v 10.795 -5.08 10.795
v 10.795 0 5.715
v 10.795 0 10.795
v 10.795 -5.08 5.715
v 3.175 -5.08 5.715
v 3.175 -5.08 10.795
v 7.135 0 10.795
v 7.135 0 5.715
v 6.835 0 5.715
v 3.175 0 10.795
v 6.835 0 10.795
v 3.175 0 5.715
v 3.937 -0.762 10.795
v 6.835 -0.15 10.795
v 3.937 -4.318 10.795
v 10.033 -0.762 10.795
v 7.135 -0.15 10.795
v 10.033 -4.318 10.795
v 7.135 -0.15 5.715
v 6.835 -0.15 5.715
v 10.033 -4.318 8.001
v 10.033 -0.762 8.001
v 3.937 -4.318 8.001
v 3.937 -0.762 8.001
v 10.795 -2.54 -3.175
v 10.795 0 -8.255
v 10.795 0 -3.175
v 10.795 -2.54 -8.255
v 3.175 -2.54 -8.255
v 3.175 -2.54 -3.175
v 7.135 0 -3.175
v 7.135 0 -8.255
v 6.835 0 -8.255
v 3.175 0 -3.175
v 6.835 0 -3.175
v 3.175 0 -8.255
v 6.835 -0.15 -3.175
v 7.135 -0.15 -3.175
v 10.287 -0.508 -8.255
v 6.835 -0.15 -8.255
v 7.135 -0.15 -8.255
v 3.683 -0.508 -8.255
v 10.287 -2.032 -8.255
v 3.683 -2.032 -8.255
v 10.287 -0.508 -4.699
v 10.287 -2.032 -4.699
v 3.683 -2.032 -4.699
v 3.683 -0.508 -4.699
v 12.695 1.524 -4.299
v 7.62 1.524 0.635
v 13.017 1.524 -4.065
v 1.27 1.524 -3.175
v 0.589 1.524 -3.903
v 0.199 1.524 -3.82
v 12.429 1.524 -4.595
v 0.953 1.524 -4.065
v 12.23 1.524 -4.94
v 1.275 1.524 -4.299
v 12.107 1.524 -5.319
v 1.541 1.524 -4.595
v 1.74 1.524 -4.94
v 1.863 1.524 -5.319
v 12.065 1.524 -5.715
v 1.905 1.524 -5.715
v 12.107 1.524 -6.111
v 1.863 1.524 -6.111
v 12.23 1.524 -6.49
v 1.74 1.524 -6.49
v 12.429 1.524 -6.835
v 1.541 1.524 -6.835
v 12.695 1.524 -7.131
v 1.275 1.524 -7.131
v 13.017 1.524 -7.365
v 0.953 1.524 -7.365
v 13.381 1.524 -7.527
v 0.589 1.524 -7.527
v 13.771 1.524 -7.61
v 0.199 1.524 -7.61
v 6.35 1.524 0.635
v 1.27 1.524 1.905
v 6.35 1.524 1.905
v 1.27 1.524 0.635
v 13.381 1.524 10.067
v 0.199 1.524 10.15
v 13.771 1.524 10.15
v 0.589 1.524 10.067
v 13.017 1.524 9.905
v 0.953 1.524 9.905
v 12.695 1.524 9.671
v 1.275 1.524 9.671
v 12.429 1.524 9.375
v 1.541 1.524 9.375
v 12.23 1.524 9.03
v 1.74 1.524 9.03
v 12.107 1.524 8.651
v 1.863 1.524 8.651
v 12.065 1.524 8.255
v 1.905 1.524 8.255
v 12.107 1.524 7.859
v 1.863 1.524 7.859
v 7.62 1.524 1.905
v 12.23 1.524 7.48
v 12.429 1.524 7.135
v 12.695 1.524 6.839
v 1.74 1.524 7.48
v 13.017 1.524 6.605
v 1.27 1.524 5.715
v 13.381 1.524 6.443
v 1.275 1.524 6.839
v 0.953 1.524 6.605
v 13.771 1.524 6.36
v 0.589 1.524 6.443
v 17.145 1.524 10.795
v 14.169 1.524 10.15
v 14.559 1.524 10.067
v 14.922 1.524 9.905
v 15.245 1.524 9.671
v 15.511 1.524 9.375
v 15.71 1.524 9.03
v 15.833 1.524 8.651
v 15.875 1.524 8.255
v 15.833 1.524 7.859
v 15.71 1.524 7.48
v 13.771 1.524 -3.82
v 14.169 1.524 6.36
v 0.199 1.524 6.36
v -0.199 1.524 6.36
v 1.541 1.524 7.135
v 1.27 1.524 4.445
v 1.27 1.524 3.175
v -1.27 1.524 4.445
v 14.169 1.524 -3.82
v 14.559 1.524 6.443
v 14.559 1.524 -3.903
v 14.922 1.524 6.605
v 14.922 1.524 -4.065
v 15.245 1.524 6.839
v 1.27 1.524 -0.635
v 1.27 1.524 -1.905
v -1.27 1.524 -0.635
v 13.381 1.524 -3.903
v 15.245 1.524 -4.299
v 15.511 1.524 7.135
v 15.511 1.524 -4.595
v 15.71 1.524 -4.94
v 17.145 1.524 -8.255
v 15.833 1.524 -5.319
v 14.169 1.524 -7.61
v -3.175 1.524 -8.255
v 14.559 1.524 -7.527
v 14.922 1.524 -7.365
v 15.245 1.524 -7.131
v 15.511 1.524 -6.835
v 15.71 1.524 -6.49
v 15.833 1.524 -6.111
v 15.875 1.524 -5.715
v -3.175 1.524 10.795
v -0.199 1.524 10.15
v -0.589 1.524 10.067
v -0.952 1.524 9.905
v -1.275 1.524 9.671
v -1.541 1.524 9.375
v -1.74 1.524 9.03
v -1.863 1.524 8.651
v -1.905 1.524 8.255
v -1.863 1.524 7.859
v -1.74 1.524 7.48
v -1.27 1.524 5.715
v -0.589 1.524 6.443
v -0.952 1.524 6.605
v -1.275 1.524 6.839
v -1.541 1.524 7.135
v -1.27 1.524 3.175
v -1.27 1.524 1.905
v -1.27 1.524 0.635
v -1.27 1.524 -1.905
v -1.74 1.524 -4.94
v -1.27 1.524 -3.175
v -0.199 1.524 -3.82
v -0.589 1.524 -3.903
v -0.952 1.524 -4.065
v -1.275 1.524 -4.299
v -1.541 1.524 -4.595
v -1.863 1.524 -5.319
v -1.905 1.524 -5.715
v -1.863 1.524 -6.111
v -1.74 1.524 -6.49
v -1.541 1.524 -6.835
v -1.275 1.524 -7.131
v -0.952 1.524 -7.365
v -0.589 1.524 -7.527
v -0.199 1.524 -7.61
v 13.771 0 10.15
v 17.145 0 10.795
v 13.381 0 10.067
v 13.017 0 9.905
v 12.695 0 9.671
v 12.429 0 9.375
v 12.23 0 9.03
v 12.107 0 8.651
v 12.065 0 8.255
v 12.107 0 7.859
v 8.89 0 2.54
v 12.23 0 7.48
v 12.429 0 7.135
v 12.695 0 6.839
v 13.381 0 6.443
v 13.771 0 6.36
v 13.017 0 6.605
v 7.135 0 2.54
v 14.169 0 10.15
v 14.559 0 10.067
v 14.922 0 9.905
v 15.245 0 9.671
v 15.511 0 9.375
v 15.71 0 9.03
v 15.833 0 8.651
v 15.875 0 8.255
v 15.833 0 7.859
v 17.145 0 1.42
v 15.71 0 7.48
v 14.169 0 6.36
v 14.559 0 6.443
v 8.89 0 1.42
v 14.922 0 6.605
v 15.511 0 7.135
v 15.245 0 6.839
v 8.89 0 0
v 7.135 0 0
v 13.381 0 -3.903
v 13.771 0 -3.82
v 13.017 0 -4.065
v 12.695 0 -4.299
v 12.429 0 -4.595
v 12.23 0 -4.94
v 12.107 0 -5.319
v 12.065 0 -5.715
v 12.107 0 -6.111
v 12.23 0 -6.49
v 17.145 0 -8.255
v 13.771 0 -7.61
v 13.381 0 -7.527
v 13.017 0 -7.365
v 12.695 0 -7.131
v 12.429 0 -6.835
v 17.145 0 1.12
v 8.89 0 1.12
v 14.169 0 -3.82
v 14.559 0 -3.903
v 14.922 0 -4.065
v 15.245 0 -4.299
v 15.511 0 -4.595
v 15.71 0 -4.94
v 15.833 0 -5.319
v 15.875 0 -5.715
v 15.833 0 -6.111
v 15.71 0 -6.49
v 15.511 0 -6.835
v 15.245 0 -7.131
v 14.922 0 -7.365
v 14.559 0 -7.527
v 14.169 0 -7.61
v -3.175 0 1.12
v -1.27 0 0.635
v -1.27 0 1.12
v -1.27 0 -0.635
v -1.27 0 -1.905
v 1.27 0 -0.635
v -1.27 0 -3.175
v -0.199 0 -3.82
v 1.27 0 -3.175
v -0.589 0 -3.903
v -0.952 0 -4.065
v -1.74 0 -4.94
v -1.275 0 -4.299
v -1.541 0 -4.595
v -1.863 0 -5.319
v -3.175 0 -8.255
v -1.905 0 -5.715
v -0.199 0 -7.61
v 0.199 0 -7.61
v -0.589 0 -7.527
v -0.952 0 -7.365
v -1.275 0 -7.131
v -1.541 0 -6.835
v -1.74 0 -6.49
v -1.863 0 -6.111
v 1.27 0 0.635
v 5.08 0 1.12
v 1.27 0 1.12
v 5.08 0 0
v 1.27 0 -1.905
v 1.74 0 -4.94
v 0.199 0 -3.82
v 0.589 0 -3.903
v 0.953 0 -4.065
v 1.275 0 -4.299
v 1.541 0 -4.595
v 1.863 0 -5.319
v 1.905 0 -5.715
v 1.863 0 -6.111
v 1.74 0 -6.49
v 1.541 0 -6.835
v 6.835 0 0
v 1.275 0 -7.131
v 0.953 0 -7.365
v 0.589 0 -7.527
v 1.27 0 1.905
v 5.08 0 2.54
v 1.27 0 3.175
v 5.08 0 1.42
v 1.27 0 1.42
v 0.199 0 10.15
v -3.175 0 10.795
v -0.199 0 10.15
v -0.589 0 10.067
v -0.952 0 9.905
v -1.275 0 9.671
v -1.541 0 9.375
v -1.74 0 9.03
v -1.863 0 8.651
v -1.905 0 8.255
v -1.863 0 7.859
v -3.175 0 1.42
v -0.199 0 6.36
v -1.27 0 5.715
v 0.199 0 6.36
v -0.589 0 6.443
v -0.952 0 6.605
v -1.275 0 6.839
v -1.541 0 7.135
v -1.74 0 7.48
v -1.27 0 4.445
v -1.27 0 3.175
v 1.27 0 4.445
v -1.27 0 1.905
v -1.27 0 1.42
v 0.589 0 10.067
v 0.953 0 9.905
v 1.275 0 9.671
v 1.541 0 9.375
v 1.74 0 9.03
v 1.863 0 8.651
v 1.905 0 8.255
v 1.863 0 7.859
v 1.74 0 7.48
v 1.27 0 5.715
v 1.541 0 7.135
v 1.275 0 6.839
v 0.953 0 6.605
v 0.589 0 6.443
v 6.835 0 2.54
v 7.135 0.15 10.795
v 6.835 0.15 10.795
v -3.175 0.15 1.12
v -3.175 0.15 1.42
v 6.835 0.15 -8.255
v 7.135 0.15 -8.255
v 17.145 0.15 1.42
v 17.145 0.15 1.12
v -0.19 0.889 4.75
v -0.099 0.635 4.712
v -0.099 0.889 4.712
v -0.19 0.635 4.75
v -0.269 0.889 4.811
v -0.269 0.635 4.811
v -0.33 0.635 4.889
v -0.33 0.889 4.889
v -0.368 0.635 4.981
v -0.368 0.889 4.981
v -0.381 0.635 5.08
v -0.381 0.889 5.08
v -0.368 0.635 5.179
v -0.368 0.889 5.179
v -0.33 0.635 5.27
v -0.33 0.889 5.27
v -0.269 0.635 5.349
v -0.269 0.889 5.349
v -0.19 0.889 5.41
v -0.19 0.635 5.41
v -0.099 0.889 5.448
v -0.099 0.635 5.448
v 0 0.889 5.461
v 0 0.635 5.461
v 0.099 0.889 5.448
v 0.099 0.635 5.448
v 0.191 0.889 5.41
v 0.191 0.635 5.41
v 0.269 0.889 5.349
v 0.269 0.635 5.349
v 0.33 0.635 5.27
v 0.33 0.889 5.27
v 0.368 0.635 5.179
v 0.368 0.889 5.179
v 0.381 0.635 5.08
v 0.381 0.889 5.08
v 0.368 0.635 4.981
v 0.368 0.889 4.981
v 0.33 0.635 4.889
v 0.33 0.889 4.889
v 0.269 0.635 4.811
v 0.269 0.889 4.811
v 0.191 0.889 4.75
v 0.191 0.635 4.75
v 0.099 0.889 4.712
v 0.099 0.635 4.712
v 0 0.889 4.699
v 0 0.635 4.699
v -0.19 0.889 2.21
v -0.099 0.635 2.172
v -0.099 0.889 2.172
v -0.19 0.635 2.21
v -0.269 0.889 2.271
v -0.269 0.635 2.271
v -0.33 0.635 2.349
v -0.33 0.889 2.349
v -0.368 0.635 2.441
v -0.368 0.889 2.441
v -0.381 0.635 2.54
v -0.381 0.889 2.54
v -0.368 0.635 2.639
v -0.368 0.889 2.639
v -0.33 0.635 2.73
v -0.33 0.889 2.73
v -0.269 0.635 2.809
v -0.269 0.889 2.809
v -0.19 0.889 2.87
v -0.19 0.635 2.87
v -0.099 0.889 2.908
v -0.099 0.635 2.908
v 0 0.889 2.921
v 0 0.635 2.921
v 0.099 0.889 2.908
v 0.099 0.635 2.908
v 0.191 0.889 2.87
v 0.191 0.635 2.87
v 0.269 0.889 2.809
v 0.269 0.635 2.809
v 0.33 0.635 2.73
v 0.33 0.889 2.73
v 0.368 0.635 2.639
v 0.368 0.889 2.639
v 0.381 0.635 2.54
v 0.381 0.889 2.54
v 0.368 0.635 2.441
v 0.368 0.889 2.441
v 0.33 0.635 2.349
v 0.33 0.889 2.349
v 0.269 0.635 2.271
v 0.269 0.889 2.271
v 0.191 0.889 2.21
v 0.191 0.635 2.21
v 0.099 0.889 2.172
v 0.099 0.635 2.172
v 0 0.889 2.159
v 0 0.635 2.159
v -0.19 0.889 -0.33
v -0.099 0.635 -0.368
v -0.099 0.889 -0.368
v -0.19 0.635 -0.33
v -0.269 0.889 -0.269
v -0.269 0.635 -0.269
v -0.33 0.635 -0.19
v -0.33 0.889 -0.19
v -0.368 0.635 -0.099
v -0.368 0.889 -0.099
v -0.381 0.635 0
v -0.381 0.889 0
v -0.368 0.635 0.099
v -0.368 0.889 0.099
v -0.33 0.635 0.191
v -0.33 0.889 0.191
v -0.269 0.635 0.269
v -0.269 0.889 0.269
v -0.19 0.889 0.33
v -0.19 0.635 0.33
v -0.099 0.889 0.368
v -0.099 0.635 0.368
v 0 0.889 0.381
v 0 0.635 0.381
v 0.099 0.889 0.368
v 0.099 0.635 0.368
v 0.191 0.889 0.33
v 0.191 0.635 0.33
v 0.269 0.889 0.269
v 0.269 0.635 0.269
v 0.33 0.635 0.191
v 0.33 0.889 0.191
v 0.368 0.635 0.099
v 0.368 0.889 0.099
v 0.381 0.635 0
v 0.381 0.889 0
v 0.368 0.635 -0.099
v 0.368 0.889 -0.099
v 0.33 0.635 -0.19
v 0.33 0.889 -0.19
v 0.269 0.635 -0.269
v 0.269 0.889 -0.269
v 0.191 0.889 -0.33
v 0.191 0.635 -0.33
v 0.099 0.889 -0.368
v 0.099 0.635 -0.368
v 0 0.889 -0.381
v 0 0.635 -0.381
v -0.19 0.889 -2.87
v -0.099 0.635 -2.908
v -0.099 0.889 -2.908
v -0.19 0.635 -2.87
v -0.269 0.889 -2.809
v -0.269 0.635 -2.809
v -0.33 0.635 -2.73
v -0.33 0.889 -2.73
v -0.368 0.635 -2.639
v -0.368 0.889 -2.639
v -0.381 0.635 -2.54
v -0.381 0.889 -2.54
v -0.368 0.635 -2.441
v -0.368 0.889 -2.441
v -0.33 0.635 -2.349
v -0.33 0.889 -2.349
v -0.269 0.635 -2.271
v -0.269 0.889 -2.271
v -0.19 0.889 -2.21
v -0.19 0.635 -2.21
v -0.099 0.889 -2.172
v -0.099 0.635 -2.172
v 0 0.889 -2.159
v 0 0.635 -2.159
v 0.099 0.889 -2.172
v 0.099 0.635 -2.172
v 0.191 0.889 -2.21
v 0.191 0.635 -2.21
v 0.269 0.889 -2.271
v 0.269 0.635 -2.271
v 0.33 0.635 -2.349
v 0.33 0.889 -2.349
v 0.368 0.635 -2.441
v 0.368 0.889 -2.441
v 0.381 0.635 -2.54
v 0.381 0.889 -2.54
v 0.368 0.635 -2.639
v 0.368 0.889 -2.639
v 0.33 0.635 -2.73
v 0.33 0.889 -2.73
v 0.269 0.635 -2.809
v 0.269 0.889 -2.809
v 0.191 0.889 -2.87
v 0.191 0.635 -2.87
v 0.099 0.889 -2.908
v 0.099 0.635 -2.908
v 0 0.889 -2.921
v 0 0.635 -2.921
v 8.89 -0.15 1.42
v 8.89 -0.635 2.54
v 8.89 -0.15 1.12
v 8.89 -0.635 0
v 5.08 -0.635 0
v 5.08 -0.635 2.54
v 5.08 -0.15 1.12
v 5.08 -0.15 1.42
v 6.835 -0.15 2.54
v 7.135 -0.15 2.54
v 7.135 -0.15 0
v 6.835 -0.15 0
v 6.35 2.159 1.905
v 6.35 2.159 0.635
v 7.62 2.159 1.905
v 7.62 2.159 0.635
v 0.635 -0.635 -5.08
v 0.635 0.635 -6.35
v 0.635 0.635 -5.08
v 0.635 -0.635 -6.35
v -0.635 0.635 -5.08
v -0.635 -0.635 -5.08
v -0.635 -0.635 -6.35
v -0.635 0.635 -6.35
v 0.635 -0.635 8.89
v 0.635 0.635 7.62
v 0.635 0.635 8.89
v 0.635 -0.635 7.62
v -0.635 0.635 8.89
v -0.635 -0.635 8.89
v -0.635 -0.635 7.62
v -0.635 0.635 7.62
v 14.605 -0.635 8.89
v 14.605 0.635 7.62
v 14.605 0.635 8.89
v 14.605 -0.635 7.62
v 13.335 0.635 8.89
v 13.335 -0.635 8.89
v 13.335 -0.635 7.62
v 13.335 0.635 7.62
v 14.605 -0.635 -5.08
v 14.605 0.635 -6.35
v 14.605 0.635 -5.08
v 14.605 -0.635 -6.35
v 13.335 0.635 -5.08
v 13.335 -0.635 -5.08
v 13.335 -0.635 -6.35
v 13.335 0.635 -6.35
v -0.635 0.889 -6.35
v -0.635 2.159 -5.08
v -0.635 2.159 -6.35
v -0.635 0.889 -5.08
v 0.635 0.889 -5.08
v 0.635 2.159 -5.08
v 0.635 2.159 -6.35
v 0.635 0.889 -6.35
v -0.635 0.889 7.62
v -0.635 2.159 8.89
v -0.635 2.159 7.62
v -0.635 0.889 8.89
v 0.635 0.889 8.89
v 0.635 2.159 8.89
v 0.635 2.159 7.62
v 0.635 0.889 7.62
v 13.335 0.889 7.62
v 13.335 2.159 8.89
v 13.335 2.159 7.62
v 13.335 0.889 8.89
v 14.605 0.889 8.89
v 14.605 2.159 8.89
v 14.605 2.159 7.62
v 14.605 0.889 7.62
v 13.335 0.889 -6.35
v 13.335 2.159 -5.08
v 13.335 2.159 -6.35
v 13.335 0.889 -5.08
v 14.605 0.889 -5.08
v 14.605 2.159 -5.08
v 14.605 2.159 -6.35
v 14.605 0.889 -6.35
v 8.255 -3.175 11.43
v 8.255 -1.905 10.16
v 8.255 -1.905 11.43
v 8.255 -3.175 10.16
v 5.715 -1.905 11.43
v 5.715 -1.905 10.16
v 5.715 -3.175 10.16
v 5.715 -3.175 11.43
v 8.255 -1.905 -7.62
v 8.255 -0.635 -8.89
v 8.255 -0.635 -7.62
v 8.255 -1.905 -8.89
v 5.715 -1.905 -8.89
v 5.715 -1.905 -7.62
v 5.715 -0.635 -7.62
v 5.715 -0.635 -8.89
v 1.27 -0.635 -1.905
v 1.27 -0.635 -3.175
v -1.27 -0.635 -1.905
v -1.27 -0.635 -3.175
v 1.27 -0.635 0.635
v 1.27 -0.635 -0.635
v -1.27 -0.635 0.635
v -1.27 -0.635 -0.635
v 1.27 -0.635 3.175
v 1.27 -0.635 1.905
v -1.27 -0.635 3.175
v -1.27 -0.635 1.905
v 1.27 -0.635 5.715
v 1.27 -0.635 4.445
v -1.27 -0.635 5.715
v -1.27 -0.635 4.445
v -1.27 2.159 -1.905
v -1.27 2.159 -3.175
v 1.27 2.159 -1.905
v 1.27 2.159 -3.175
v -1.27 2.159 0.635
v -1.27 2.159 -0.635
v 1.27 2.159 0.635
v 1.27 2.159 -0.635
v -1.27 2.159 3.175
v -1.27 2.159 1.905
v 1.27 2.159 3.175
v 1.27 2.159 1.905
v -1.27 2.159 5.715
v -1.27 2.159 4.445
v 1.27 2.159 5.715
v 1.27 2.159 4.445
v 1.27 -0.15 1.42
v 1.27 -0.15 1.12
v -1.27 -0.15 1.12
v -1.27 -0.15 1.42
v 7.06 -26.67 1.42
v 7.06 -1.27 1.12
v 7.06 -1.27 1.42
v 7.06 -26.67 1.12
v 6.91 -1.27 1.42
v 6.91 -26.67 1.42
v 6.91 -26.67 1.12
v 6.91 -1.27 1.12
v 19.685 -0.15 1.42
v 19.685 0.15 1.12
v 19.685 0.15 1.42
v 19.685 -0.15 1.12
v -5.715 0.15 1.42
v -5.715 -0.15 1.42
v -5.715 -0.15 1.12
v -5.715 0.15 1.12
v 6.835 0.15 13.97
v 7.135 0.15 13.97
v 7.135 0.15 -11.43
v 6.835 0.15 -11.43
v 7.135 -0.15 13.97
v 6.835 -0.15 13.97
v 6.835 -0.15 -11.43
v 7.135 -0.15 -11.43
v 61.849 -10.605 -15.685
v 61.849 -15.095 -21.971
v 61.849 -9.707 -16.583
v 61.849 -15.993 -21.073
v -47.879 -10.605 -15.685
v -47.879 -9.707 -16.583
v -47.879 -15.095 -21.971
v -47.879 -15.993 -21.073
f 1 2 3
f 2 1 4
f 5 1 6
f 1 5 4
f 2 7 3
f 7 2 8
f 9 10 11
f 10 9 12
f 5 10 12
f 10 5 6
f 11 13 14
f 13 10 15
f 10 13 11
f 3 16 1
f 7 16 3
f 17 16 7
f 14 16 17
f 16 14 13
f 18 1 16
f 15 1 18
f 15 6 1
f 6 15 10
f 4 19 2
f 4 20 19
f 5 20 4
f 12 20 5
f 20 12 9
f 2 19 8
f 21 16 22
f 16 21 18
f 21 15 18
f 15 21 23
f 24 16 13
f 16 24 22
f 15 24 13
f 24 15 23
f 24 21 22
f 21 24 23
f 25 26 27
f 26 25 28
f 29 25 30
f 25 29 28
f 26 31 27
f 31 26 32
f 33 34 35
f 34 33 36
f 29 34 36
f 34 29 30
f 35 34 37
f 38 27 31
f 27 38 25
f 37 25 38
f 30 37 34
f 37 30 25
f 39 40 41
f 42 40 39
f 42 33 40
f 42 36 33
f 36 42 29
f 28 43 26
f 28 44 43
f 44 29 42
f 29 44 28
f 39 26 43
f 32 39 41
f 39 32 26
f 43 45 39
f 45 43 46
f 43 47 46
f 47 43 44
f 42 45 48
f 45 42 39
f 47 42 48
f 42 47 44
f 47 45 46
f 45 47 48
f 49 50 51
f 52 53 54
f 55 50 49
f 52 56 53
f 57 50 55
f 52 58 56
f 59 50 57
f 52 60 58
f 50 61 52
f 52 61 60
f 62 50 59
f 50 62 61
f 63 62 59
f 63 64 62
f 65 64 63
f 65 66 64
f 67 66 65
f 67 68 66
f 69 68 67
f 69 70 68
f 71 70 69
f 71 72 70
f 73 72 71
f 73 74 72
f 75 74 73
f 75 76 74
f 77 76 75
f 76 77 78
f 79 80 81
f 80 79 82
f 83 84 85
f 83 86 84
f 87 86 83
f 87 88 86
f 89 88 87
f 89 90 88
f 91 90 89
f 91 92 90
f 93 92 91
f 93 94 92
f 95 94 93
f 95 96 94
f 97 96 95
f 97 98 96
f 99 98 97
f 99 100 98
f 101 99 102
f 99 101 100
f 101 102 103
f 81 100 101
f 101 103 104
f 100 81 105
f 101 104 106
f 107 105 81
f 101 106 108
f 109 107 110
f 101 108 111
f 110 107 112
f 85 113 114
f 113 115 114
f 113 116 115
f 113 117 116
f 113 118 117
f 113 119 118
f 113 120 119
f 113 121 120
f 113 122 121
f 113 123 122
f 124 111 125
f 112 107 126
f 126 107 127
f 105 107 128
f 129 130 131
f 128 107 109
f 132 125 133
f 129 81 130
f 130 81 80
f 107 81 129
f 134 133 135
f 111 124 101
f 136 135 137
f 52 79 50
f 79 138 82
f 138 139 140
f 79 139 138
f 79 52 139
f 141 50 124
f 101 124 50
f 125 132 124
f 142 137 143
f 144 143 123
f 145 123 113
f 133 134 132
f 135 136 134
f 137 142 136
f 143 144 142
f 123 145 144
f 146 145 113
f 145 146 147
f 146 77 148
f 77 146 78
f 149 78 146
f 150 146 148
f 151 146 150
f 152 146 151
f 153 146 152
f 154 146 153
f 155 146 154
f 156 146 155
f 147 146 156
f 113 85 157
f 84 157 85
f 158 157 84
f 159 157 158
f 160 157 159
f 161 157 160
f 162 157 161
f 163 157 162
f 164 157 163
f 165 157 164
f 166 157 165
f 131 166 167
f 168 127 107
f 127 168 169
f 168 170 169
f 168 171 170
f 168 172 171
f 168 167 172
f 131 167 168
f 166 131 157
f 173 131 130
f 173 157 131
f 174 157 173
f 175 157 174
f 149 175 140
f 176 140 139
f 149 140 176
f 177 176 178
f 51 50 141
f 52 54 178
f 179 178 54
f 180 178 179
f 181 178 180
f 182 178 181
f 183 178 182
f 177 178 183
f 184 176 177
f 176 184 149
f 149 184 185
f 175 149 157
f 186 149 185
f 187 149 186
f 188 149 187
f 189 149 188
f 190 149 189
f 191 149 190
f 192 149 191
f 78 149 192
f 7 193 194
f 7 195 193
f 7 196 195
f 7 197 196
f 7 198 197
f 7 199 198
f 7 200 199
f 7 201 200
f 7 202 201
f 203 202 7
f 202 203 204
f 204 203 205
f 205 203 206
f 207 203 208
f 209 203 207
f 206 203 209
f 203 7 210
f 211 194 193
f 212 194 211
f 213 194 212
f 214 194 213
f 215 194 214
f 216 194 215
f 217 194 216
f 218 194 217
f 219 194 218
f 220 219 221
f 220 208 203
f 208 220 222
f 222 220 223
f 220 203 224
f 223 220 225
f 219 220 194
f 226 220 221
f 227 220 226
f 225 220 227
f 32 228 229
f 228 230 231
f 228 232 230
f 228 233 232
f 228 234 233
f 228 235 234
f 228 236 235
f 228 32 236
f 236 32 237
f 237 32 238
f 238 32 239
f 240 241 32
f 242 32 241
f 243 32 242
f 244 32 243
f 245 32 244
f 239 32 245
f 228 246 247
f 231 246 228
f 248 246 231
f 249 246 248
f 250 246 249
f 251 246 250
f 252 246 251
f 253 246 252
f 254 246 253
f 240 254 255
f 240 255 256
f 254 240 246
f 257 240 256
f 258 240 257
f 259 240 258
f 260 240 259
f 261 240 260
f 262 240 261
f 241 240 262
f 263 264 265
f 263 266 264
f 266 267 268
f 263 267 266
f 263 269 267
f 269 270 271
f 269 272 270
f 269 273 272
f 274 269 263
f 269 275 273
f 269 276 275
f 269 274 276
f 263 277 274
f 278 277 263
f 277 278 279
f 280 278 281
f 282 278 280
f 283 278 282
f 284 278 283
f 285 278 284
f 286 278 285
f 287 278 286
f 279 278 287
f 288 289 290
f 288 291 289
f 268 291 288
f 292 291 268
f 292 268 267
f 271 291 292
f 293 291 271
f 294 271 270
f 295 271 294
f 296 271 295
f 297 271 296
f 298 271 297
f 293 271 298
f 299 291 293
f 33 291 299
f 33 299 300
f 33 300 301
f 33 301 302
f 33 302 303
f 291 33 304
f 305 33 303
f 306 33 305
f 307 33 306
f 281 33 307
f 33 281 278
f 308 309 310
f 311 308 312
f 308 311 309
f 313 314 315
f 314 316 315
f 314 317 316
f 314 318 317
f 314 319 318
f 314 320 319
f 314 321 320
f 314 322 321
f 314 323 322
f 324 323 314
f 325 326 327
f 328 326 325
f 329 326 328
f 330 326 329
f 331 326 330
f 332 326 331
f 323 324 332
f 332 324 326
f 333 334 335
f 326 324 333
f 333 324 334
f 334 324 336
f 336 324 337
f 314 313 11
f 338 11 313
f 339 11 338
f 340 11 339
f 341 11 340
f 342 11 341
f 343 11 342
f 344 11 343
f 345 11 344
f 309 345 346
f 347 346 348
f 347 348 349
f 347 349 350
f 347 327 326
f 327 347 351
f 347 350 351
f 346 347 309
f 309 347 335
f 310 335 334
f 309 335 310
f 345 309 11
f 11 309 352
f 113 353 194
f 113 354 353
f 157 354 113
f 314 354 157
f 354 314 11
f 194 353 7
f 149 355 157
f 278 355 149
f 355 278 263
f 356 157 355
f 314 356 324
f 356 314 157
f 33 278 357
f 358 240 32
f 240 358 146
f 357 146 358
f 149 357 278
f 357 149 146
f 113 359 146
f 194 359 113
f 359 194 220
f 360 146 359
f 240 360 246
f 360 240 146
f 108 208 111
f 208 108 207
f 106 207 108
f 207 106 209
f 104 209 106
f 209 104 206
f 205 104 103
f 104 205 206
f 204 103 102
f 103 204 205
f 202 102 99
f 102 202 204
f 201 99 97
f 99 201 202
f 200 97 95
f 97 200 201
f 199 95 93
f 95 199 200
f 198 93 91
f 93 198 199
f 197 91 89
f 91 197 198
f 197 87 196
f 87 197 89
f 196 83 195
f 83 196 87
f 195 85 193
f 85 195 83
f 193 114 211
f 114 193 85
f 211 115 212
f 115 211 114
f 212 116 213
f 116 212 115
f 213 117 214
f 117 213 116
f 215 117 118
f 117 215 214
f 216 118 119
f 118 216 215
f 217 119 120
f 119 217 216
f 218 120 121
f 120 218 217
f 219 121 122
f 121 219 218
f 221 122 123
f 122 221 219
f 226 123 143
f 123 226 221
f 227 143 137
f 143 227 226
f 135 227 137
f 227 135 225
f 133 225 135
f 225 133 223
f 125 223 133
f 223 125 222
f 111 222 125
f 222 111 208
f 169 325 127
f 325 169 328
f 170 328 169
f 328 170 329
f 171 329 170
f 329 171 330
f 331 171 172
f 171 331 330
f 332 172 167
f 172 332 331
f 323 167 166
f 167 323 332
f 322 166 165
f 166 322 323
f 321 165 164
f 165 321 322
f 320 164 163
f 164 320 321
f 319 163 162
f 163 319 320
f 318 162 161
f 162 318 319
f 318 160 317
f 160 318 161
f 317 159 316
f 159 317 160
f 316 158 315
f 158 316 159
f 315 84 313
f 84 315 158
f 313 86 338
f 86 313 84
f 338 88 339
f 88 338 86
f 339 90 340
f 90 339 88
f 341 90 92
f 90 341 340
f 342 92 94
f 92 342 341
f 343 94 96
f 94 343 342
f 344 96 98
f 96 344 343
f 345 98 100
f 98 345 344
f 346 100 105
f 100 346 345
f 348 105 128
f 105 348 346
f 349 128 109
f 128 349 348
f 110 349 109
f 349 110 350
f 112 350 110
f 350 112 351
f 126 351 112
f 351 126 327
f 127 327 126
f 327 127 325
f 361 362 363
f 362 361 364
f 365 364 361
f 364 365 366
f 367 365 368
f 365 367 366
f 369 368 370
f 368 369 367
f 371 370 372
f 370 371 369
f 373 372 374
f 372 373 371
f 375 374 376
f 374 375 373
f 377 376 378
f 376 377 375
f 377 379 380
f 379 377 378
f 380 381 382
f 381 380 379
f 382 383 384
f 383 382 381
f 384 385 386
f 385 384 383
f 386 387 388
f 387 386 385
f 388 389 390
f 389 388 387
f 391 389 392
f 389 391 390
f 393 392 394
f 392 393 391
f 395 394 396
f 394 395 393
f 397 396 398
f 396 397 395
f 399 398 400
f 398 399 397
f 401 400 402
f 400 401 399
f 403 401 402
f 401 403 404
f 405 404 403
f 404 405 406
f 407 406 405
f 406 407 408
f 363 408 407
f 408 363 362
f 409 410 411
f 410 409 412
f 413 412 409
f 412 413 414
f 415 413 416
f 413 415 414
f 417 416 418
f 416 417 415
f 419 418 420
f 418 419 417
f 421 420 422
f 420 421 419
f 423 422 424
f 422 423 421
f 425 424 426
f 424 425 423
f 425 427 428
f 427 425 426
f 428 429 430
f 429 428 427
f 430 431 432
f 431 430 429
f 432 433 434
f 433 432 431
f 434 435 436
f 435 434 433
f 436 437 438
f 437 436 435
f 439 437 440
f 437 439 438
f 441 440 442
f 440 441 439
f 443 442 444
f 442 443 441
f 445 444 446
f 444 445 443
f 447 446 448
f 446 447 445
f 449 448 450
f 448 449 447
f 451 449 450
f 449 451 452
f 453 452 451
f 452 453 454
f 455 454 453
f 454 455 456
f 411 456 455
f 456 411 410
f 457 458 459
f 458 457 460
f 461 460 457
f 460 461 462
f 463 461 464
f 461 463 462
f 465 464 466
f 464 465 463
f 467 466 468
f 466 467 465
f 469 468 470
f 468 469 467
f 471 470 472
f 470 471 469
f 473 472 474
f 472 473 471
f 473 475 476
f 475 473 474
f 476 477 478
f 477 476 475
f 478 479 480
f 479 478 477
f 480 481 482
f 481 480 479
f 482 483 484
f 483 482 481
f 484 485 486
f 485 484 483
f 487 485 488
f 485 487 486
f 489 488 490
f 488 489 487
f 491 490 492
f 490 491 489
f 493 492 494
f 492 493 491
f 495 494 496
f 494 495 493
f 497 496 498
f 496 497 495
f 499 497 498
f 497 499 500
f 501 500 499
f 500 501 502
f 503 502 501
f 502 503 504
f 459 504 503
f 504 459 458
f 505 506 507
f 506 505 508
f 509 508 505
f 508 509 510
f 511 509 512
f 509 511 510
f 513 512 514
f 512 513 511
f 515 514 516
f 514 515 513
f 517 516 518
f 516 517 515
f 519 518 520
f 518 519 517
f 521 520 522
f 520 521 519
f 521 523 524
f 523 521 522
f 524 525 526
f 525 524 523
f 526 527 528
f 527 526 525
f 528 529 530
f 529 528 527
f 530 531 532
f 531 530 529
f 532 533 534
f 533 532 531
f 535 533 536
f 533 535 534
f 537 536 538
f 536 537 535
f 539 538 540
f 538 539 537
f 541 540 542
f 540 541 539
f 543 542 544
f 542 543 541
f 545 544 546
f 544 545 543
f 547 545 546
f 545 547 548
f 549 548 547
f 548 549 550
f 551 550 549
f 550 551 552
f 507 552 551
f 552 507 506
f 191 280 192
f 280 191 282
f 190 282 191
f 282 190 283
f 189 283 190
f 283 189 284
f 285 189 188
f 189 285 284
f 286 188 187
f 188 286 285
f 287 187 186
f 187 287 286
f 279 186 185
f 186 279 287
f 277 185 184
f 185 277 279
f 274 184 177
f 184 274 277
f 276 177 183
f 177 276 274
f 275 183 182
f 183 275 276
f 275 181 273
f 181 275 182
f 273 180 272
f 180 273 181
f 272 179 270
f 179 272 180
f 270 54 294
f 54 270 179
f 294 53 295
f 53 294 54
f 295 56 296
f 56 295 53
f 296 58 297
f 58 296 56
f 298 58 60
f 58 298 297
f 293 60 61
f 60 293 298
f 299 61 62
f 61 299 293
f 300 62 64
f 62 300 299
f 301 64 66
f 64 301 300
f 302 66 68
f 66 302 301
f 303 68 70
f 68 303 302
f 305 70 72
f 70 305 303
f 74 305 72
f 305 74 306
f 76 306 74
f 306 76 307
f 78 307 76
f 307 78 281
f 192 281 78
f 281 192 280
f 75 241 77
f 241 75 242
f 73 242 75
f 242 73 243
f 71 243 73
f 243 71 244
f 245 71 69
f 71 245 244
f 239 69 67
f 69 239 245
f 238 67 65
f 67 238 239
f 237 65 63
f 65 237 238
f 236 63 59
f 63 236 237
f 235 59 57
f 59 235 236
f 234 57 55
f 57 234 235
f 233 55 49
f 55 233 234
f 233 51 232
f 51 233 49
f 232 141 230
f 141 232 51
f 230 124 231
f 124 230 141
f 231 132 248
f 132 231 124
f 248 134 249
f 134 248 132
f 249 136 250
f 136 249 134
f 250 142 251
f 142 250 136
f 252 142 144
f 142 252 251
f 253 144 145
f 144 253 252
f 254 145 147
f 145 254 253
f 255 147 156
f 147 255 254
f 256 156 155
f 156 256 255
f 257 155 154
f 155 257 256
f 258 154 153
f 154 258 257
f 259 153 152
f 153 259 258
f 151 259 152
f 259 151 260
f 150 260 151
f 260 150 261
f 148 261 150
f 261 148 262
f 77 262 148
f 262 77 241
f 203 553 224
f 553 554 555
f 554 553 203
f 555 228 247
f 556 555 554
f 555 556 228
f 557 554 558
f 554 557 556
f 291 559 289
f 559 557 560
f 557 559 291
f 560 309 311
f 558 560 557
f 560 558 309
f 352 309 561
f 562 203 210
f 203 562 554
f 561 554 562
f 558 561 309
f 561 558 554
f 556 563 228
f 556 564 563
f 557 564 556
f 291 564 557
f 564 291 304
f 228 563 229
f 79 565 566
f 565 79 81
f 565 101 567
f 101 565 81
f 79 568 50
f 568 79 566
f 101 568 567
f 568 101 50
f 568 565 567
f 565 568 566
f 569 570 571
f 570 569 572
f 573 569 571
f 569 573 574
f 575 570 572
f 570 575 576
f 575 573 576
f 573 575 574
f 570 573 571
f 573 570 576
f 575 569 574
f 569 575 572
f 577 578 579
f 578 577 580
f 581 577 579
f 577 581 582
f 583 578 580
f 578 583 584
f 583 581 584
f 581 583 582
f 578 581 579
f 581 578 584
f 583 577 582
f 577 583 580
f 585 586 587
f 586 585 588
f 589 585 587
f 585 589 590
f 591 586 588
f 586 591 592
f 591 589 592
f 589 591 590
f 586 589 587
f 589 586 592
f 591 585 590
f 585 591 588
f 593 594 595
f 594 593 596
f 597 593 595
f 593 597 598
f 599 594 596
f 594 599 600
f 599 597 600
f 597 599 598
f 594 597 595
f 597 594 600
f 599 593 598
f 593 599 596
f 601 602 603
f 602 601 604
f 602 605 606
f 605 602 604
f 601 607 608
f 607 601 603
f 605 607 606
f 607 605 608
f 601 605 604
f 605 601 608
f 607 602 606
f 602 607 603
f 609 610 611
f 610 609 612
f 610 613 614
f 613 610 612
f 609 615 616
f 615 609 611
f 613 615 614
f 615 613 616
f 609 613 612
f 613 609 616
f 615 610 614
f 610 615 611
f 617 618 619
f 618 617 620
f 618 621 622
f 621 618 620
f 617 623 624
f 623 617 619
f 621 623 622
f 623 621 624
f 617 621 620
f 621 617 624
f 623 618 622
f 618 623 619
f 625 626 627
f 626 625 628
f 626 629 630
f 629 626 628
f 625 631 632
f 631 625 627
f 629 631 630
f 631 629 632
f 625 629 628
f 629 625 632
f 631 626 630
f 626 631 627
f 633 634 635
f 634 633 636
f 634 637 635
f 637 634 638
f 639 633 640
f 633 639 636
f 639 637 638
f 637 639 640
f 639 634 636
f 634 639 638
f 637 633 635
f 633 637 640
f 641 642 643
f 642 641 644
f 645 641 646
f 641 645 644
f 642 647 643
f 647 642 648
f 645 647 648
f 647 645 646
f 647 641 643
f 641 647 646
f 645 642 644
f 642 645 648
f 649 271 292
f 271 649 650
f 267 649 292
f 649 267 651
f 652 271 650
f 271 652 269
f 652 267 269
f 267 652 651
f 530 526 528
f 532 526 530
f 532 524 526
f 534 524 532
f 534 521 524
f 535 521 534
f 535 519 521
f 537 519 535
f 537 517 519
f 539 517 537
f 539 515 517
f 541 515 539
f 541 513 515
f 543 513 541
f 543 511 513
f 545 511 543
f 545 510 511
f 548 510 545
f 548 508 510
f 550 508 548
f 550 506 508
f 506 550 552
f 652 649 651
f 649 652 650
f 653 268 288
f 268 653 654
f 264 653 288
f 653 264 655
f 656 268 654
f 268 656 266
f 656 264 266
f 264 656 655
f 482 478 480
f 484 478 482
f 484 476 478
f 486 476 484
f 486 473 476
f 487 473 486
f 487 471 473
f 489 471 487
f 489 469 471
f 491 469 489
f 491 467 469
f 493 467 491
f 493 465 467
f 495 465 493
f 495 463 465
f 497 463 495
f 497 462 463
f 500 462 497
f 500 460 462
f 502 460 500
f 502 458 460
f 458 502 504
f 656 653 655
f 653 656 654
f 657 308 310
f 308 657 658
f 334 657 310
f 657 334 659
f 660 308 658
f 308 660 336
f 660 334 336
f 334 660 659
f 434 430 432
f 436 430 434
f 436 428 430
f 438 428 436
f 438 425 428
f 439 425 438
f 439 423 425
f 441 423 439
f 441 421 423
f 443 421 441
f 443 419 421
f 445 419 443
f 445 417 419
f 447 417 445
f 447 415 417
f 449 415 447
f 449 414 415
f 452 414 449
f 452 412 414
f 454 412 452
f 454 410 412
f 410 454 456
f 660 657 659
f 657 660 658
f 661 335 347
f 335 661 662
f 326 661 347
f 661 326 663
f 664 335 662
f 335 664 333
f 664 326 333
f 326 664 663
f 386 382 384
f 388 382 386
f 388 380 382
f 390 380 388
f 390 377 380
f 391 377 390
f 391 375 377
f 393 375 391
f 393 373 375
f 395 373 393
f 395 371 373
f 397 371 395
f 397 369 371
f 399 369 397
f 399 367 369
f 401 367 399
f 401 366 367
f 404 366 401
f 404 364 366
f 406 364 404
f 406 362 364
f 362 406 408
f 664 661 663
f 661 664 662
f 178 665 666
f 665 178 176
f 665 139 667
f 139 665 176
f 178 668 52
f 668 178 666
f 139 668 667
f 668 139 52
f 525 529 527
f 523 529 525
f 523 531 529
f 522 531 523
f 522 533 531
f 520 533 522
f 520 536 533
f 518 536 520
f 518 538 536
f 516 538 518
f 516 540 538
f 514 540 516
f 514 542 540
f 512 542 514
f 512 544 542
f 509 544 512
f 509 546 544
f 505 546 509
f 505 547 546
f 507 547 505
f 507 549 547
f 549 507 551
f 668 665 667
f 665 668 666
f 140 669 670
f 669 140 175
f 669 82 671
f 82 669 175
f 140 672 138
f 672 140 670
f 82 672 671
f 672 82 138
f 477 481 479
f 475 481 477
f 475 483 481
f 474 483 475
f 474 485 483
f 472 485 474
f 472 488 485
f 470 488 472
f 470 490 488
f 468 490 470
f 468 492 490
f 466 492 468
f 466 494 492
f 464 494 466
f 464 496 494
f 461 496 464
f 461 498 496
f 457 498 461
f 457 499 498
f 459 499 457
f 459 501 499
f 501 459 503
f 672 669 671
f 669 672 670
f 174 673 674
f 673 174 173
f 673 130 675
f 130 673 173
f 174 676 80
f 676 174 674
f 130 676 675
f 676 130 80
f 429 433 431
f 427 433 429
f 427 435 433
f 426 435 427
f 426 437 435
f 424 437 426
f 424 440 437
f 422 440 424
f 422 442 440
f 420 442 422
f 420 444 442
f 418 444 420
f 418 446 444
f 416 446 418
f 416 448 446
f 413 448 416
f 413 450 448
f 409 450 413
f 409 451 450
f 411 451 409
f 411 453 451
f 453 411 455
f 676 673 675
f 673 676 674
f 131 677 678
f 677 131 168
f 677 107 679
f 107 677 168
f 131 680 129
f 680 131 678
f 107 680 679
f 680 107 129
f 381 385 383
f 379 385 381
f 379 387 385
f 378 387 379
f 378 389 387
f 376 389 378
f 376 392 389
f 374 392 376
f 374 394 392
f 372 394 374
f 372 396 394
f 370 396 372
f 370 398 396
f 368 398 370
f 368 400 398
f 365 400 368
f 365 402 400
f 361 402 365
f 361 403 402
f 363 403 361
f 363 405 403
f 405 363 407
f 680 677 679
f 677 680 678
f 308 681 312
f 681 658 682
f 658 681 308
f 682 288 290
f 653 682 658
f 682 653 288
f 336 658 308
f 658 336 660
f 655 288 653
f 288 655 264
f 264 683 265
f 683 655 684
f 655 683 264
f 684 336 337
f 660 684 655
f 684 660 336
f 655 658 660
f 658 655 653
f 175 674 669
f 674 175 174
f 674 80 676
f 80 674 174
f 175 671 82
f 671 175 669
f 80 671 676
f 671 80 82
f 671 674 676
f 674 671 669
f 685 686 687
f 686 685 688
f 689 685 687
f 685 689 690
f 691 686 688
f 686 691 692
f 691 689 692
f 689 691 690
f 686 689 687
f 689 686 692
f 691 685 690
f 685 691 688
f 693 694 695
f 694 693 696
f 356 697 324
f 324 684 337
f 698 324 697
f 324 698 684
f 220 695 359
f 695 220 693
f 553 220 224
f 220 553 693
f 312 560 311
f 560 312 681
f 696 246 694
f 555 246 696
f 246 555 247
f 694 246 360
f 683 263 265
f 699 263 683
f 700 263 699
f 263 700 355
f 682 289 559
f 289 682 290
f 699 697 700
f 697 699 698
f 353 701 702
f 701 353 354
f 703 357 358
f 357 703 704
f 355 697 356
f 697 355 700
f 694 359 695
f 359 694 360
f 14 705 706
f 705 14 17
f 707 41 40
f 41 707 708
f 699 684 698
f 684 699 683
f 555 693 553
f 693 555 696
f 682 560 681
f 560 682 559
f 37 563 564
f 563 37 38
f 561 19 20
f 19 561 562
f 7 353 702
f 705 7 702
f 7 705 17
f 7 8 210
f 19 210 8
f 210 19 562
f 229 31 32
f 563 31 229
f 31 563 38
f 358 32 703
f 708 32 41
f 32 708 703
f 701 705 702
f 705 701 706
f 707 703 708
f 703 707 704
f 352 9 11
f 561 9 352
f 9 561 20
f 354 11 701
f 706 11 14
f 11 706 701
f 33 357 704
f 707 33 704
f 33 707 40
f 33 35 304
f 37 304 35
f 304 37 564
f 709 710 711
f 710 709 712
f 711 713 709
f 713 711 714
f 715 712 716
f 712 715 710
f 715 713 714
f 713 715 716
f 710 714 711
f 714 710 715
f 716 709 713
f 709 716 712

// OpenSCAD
include <../mo/mo.scad>

AdaBatteryChargerMicroLiPo_ComponentHeight = 0.03 * in;
AdaBatteryChargerMicroLiPo_PCBDepth = 0.06 * in;
AdaBatteryChargerMicroLiPo_Height = 0.75 * in;
AdaBatteryChargerMicroLiPo_Width = 0.8 * in;
AdaBatteryChargerMicroLiPo_Depth = AdaBatteryChargerMicroLiPo_ComponentHeight + AdaBatteryChargerMicroLiPo_PCBDepth;
AdaBatteryChargerMicroLiPo_WireSpacing = 0.1 * in;

// None of these are specified on the site.  
AdaBatteryChargerMicroLiPo_HoleDiameter = 0.15 * in;
AdaBatteryChargerMicroLiPo_HoleWidth = 0.55 * in;
AdaBatteryChargerMicroLiPo_HoleHeight = 0.55 * in;

AdaBatteryChargerMicroLiPo_PCBColor = [ 0, 0.2, 1 ];

AdaBatteryChargerMicroLiPo_ChipHeight = 0.1 * in;
AdaBatteryChargerMicroLiPo_ChipWidth = 0.15 * in;
AdaBatteryChargerMicroLiPo_ChipDepth = 0.025 * in;

AdaBatteryChargerMicroLiPo_PowerConnectorHeight = 0.2 * in;
AdaBatteryChargerMicroLiPo_PowerConnectorWidth = 0.3 * in;
AdaBatteryChargerMicroLiPo_PowerConnectorDepth = 0.2 * in;
AdaBatteryChargerMicroLiPo_PowerConnectorWall = 0.03 * in;

AdaBatteryChargerMicroLiPo_USBMicroConnectorHeight = 0.2 * in;
AdaBatteryChargerMicroLiPo_USBMicroConnectorWidth = 0.3 * in;
AdaBatteryChargerMicroLiPo_USBMicroConnectorDepth = 0.1 * in;
AdaBatteryChargerMicroLiPo_USBMicroConnectorWall = 0.02 * in;

AdaBatteryChargerMicroLiPo_PCBSignals = 4;
AdaBatteryChargerMicroLiPo_PCBSignalSpacing = 0.1 * in;
AdaBatteryChargerMicroLiPo_PCBSignalHoleRadius = 0.015 * in;

AdaBatteryChargerMicroLiPo_PowerConnectorOffset = AdaBatteryChargerMicroLiPo_HoleHeight/2;
AdaBatteryChargerMicroLiPo_USBMicroConnectorOffset = -AdaBatteryChargerMicroLiPo_HoleHeight/2;

positions = [ 
  [ [ 0, 0, 0 ], [ 0, 0, 1 ], 0 ],
  [ [ 0, AdaBatteryChargerMicroLiPo_PCBDepth, 0 ], [ 0, 0, 1 ], 180 ],

  [ [ -AdaBatteryChargerMicroLiPo_HoleWidth/2, 0, -AdaBatteryChargerMicroLiPo_HoleHeight/2 ], [0, 0, 1 ], 0 ], 
  [ [ -AdaBatteryChargerMicroLiPo_HoleWidth/2, 0, AdaBatteryChargerMicroLiPo_HoleHeight/2 ], [0, 0, 1 ], 0 ], 
  [ [ AdaBatteryChargerMicroLiPo_HoleWidth/2, 0, AdaBatteryChargerMicroLiPo_HoleHeight/2 ], [0, 0, 1 ], 0 ], 
  [ [ AdaBatteryChargerMicroLiPo_HoleWidth/2, 0, -AdaBatteryChargerMicroLiPo_HoleHeight/2 ], [0, 0, 1 ], 0 ], 

  [ [ -AdaBatteryChargerMicroLiPo_HoleWidth/2, AdaBatteryChargerMicroLiPo_PCBDepth, -AdaBatteryChargerMicroLiPo_HoleHeight/2 ], [0, 0, 1 ], 180 ], 
  [ [ -AdaBatteryChargerMicroLiPo_HoleWidth/2, AdaBatteryChargerMicroLiPo_PCBDepth, AdaBatteryChargerMicroLiPo_HoleHeight/2 ], [0, 0, 1 ], 180 ], 
  [ [ AdaBatteryChargerMicroLiPo_HoleWidth/2, AdaBatteryChargerMicroLiPo_PCBDepth, AdaBatteryChargerMicroLiPo_HoleHeight/2 ], [0, 0, 1 ], 180 ], 
  [ [ AdaBatteryChargerMicroLiPo_HoleWidth/2, AdaBatteryChargerMicroLiPo_PCBDepth, -AdaBatteryChargerMicroLiPo_HoleHeight/2 ], [0, 0, 1 ], 180 ], 

  [ [ 0, -AdaBatteryChargerMicroLiPo_PowerConnectorDepth/2, AdaBatteryChargerMicroLiPo_Height/2 ], [ 1, 0, 0 ], -90 ],
  [ [ 0, -AdaBatteryChargerMicroLiPo_USBMicroConnectorDepth/2, -AdaBatteryChargerMicroLiPo_Height/2 ], [ 1, 0, 0 ], 90 ],
  [ [ -AdaBatteryChargerMicroLiPo_HoleWidth/2, 0, -1.5 * AdaBatteryChargerMicroLiPo_PCBSignalSpacing ], [0, 0, 1 ], 0 ], 
  [ [ -AdaBatteryChargerMicroLiPo_HoleWidth/2, 0, -0.5 * AdaBatteryChargerMicroLiPo_PCBSignalSpacing ], [0, 0, 1 ], 0 ], 
  [ [ -AdaBatteryChargerMicroLiPo_HoleWidth/2, 0, 0.5 * AdaBatteryChargerMicroLiPo_PCBSignalSpacing ], [0, 0, 1 ], 0 ], 
  [ [ -AdaBatteryChargerMicroLiPo_HoleWidth/2, 0, 1.5 * AdaBatteryChargerMicroLiPo_PCBSignalSpacing ], [0, 0, 1 ], 0 ], 
  [ [ -AdaBatteryChargerMicroLiPo_HoleWidth/2, AdaBatteryChargerMicroLiPo_PCBDepth, -1.5 * AdaBatteryChargerMicroLiPo_PCBSignalSpacing ], [0, 0, 1 ], 180 ], 
  [ [ -AdaBatteryChargerMicroLiPo_HoleWidth/2, AdaBatteryChargerMicroLiPo_PCBDepth, -0.5 * AdaBatteryChargerMicroLiPo_PCBSignalSpacing ], [0, 0, 1 ], 180 ], 
  [ [ -AdaBatteryChargerMicroLiPo_HoleWidth/2, AdaBatteryChargerMicroLiPo_PCBDepth, 0.5 * AdaBatteryChargerMicroLiPo_PCBSignalSpacing ], [0, 0, 1 ], 180 ], 
  [ [ -AdaBatteryChargerMicroLiPo_HoleWidth/2, AdaBatteryChargerMicroLiPo_PCBDepth, 1.5 * AdaBatteryChargerMicroLiPo_PCBSignalSpacing ], [0, 0, 1 ], 180 ],

  [ [ -AdaBatteryChargerMicroLiPo_HoleWidth/2, 0, 0 ], [0, 0, 1 ], 0 ], 
  [ [ -AdaBatteryChargerMicroLiPo_HoleWidth/2, AdaBatteryChargerMicroLiPo_PCBDepth, 0 ], [0, 0, 1 ], 180 ], 
];

module adaBatteryChargerMicroLiPo( p = 0, info = false ) {
  moPresent( positions, p, info ) {
    moPitch() moPose( t = [ 0, 0, -AdaBatteryChargerMicroLiPo_PCBDepth ] ) {
         union() {
          color( AdaBatteryChargerMicroLiPo_PCBColor ) {
            linear_extrude( height = AdaBatteryChargerMicroLiPo_PCBDepth, twist = 0 ) {
              difference() {
                square( [ AdaBatteryChargerMicroLiPo_Width, AdaBatteryChargerMicroLiPo_Height ], center = true );
                translate( [ AdaBatteryChargerMicroLiPo_HoleWidth/2, AdaBatteryChargerMicroLiPo_HoleHeight/2 ] ) {
                  circle( d = AdaBatteryChargerMicroLiPo_HoleDiameter, center = true );
                }
                translate( [ -AdaBatteryChargerMicroLiPo_HoleWidth/2, AdaBatteryChargerMicroLiPo_HoleHeight/2 ] ) {
                  circle( d = AdaBatteryChargerMicroLiPo_HoleDiameter, center = true );
                }
                translate( [ -AdaBatteryChargerMicroLiPo_HoleWidth/2, -AdaBatteryChargerMicroLiPo_HoleHeight/2 ] ) {
                  circle( d = AdaBatteryChargerMicroLiPo_HoleDiameter, center = true );
                }
                translate( [ AdaBatteryChargerMicroLiPo_HoleWidth/2, -AdaBatteryChargerMicroLiPo_HoleHeight/2 ] ) {
                  circle( d = AdaBatteryChargerMicroLiPo_HoleDiameter, center = true );
                }
                translate( [ -AdaBatteryChargerMicroLiPo_HoleWidth / 2, 0, 0 ] ) {
                  for ( i = [ -AdaBatteryChargerMicroLiPo_PCBSignals/2: AdaBatteryChargerMicroLiPo_PCBSignals/2-1 ] ) {
                    translate( [ 0, i * AdaBatteryChargerMicroLiPo_PCBSignalSpacing + AdaBatteryChargerMicroLiPo_PCBSignalSpacing / 2, 0 ] )
                      circle( r = AdaBatteryChargerMicroLiPo_PCBSignalHoleRadius, center = true );        
              }
            }
              }
            }                     
          }
          // Chip
          translate( [ 0, 0, AdaBatteryChargerMicroLiPo_PCBDepth+AdaBatteryChargerMicroLiPo_ChipDepth / 2 ] ) {
            color( [ 0, 0, 0 ] ) {
              cube( [ AdaBatteryChargerMicroLiPo_ChipWidth, AdaBatteryChargerMicroLiPo_ChipHeight, AdaBatteryChargerMicroLiPo_ChipDepth ], center = true );                
            }
          }
          // Power Connector
          translate( [ 0, AdaBatteryChargerMicroLiPo_PowerConnectorOffset, AdaBatteryChargerMicroLiPo_PCBDepth + AdaBatteryChargerMicroLiPo_PowerConnectorDepth /2] ) {
            color( [ 1, 1, 1 ] ) {
              difference() {
                cube( [ AdaBatteryChargerMicroLiPo_PowerConnectorWidth, AdaBatteryChargerMicroLiPo_PowerConnectorHeight, AdaBatteryChargerMicroLiPo_PowerConnectorDepth ], center = true );
                translate( [ 0, 2 * AdaBatteryChargerMicroLiPo_PowerConnectorWall, 0 ] )
                cube( [ AdaBatteryChargerMicroLiPo_PowerConnectorWidth - 2 * AdaBatteryChargerMicroLiPo_PowerConnectorWall, 
                        AdaBatteryChargerMicroLiPo_PowerConnectorHeight - 2 * AdaBatteryChargerMicroLiPo_PowerConnectorWall, 
                        AdaBatteryChargerMicroLiPo_PowerConnectorDepth - 2 * AdaBatteryChargerMicroLiPo_PowerConnectorWall ], center = true );
                
              }
            }
          }
          // USB Connector
          translate( [ 0, AdaBatteryChargerMicroLiPo_USBMicroConnectorOffset, AdaBatteryChargerMicroLiPo_PCBDepth + AdaBatteryChargerMicroLiPo_USBMicroConnectorDepth /2] ) {
            color( Aluminum ) {
              difference() {
                cube( [ AdaBatteryChargerMicroLiPo_USBMicroConnectorWidth, AdaBatteryChargerMicroLiPo_USBMicroConnectorHeight, AdaBatteryChargerMicroLiPo_USBMicroConnectorDepth ], center = true );
                translate( [ 0, -2 * AdaBatteryChargerMicroLiPo_USBMicroConnectorWall, 0 ] )
                cube( [ AdaBatteryChargerMicroLiPo_USBMicroConnectorWidth - 2 * AdaBatteryChargerMicroLiPo_USBMicroConnectorWall, 
                        AdaBatteryChargerMicroLiPo_USBMicroConnectorHeight - 2 * AdaBatteryChargerMicroLiPo_USBMicroConnectorWall, 
                        AdaBatteryChargerMicroLiPo_USBMicroConnectorDepth - 2 * AdaBatteryChargerMicroLiPo_USBMicroConnectorWall ], center = true );
                
              }
            }
          }

      }
    }
  }
}


function adaBatteryChargerMicroLiPoPosition( p = 0 ) = positions[ p ];

moMoveOriginTo( adaBatteryChargerMicroLiPoPosition( 13 ) ) {
  adaBatteryChargerMicroLiPo( 0, info = true, $name = true );
}
